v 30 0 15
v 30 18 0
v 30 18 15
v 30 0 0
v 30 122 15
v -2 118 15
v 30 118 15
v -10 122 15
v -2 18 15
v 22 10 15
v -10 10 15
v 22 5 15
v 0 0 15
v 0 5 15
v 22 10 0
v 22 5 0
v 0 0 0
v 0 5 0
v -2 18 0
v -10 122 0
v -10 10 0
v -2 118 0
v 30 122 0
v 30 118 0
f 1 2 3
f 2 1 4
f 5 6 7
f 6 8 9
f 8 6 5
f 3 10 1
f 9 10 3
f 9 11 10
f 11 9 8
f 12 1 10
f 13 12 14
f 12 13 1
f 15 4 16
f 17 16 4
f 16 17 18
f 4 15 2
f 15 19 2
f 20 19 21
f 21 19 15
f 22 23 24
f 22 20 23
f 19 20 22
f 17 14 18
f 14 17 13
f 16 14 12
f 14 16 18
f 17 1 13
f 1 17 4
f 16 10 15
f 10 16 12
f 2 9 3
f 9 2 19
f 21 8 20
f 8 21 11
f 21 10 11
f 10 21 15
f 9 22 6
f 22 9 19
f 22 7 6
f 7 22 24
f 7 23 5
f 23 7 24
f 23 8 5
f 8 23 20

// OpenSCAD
difference(){
    union(){
        cube([30,5,15]);
        translate([22,0,0]) cube([8,18,15]);
        translate([-10,10,0]) cube([40,8,15]);
        translate([-10,18,0]) cube([8,100,15]);
        translate([-10,118,0]) cube([40,4,15]);
    };
    union(){
    
    }
};
